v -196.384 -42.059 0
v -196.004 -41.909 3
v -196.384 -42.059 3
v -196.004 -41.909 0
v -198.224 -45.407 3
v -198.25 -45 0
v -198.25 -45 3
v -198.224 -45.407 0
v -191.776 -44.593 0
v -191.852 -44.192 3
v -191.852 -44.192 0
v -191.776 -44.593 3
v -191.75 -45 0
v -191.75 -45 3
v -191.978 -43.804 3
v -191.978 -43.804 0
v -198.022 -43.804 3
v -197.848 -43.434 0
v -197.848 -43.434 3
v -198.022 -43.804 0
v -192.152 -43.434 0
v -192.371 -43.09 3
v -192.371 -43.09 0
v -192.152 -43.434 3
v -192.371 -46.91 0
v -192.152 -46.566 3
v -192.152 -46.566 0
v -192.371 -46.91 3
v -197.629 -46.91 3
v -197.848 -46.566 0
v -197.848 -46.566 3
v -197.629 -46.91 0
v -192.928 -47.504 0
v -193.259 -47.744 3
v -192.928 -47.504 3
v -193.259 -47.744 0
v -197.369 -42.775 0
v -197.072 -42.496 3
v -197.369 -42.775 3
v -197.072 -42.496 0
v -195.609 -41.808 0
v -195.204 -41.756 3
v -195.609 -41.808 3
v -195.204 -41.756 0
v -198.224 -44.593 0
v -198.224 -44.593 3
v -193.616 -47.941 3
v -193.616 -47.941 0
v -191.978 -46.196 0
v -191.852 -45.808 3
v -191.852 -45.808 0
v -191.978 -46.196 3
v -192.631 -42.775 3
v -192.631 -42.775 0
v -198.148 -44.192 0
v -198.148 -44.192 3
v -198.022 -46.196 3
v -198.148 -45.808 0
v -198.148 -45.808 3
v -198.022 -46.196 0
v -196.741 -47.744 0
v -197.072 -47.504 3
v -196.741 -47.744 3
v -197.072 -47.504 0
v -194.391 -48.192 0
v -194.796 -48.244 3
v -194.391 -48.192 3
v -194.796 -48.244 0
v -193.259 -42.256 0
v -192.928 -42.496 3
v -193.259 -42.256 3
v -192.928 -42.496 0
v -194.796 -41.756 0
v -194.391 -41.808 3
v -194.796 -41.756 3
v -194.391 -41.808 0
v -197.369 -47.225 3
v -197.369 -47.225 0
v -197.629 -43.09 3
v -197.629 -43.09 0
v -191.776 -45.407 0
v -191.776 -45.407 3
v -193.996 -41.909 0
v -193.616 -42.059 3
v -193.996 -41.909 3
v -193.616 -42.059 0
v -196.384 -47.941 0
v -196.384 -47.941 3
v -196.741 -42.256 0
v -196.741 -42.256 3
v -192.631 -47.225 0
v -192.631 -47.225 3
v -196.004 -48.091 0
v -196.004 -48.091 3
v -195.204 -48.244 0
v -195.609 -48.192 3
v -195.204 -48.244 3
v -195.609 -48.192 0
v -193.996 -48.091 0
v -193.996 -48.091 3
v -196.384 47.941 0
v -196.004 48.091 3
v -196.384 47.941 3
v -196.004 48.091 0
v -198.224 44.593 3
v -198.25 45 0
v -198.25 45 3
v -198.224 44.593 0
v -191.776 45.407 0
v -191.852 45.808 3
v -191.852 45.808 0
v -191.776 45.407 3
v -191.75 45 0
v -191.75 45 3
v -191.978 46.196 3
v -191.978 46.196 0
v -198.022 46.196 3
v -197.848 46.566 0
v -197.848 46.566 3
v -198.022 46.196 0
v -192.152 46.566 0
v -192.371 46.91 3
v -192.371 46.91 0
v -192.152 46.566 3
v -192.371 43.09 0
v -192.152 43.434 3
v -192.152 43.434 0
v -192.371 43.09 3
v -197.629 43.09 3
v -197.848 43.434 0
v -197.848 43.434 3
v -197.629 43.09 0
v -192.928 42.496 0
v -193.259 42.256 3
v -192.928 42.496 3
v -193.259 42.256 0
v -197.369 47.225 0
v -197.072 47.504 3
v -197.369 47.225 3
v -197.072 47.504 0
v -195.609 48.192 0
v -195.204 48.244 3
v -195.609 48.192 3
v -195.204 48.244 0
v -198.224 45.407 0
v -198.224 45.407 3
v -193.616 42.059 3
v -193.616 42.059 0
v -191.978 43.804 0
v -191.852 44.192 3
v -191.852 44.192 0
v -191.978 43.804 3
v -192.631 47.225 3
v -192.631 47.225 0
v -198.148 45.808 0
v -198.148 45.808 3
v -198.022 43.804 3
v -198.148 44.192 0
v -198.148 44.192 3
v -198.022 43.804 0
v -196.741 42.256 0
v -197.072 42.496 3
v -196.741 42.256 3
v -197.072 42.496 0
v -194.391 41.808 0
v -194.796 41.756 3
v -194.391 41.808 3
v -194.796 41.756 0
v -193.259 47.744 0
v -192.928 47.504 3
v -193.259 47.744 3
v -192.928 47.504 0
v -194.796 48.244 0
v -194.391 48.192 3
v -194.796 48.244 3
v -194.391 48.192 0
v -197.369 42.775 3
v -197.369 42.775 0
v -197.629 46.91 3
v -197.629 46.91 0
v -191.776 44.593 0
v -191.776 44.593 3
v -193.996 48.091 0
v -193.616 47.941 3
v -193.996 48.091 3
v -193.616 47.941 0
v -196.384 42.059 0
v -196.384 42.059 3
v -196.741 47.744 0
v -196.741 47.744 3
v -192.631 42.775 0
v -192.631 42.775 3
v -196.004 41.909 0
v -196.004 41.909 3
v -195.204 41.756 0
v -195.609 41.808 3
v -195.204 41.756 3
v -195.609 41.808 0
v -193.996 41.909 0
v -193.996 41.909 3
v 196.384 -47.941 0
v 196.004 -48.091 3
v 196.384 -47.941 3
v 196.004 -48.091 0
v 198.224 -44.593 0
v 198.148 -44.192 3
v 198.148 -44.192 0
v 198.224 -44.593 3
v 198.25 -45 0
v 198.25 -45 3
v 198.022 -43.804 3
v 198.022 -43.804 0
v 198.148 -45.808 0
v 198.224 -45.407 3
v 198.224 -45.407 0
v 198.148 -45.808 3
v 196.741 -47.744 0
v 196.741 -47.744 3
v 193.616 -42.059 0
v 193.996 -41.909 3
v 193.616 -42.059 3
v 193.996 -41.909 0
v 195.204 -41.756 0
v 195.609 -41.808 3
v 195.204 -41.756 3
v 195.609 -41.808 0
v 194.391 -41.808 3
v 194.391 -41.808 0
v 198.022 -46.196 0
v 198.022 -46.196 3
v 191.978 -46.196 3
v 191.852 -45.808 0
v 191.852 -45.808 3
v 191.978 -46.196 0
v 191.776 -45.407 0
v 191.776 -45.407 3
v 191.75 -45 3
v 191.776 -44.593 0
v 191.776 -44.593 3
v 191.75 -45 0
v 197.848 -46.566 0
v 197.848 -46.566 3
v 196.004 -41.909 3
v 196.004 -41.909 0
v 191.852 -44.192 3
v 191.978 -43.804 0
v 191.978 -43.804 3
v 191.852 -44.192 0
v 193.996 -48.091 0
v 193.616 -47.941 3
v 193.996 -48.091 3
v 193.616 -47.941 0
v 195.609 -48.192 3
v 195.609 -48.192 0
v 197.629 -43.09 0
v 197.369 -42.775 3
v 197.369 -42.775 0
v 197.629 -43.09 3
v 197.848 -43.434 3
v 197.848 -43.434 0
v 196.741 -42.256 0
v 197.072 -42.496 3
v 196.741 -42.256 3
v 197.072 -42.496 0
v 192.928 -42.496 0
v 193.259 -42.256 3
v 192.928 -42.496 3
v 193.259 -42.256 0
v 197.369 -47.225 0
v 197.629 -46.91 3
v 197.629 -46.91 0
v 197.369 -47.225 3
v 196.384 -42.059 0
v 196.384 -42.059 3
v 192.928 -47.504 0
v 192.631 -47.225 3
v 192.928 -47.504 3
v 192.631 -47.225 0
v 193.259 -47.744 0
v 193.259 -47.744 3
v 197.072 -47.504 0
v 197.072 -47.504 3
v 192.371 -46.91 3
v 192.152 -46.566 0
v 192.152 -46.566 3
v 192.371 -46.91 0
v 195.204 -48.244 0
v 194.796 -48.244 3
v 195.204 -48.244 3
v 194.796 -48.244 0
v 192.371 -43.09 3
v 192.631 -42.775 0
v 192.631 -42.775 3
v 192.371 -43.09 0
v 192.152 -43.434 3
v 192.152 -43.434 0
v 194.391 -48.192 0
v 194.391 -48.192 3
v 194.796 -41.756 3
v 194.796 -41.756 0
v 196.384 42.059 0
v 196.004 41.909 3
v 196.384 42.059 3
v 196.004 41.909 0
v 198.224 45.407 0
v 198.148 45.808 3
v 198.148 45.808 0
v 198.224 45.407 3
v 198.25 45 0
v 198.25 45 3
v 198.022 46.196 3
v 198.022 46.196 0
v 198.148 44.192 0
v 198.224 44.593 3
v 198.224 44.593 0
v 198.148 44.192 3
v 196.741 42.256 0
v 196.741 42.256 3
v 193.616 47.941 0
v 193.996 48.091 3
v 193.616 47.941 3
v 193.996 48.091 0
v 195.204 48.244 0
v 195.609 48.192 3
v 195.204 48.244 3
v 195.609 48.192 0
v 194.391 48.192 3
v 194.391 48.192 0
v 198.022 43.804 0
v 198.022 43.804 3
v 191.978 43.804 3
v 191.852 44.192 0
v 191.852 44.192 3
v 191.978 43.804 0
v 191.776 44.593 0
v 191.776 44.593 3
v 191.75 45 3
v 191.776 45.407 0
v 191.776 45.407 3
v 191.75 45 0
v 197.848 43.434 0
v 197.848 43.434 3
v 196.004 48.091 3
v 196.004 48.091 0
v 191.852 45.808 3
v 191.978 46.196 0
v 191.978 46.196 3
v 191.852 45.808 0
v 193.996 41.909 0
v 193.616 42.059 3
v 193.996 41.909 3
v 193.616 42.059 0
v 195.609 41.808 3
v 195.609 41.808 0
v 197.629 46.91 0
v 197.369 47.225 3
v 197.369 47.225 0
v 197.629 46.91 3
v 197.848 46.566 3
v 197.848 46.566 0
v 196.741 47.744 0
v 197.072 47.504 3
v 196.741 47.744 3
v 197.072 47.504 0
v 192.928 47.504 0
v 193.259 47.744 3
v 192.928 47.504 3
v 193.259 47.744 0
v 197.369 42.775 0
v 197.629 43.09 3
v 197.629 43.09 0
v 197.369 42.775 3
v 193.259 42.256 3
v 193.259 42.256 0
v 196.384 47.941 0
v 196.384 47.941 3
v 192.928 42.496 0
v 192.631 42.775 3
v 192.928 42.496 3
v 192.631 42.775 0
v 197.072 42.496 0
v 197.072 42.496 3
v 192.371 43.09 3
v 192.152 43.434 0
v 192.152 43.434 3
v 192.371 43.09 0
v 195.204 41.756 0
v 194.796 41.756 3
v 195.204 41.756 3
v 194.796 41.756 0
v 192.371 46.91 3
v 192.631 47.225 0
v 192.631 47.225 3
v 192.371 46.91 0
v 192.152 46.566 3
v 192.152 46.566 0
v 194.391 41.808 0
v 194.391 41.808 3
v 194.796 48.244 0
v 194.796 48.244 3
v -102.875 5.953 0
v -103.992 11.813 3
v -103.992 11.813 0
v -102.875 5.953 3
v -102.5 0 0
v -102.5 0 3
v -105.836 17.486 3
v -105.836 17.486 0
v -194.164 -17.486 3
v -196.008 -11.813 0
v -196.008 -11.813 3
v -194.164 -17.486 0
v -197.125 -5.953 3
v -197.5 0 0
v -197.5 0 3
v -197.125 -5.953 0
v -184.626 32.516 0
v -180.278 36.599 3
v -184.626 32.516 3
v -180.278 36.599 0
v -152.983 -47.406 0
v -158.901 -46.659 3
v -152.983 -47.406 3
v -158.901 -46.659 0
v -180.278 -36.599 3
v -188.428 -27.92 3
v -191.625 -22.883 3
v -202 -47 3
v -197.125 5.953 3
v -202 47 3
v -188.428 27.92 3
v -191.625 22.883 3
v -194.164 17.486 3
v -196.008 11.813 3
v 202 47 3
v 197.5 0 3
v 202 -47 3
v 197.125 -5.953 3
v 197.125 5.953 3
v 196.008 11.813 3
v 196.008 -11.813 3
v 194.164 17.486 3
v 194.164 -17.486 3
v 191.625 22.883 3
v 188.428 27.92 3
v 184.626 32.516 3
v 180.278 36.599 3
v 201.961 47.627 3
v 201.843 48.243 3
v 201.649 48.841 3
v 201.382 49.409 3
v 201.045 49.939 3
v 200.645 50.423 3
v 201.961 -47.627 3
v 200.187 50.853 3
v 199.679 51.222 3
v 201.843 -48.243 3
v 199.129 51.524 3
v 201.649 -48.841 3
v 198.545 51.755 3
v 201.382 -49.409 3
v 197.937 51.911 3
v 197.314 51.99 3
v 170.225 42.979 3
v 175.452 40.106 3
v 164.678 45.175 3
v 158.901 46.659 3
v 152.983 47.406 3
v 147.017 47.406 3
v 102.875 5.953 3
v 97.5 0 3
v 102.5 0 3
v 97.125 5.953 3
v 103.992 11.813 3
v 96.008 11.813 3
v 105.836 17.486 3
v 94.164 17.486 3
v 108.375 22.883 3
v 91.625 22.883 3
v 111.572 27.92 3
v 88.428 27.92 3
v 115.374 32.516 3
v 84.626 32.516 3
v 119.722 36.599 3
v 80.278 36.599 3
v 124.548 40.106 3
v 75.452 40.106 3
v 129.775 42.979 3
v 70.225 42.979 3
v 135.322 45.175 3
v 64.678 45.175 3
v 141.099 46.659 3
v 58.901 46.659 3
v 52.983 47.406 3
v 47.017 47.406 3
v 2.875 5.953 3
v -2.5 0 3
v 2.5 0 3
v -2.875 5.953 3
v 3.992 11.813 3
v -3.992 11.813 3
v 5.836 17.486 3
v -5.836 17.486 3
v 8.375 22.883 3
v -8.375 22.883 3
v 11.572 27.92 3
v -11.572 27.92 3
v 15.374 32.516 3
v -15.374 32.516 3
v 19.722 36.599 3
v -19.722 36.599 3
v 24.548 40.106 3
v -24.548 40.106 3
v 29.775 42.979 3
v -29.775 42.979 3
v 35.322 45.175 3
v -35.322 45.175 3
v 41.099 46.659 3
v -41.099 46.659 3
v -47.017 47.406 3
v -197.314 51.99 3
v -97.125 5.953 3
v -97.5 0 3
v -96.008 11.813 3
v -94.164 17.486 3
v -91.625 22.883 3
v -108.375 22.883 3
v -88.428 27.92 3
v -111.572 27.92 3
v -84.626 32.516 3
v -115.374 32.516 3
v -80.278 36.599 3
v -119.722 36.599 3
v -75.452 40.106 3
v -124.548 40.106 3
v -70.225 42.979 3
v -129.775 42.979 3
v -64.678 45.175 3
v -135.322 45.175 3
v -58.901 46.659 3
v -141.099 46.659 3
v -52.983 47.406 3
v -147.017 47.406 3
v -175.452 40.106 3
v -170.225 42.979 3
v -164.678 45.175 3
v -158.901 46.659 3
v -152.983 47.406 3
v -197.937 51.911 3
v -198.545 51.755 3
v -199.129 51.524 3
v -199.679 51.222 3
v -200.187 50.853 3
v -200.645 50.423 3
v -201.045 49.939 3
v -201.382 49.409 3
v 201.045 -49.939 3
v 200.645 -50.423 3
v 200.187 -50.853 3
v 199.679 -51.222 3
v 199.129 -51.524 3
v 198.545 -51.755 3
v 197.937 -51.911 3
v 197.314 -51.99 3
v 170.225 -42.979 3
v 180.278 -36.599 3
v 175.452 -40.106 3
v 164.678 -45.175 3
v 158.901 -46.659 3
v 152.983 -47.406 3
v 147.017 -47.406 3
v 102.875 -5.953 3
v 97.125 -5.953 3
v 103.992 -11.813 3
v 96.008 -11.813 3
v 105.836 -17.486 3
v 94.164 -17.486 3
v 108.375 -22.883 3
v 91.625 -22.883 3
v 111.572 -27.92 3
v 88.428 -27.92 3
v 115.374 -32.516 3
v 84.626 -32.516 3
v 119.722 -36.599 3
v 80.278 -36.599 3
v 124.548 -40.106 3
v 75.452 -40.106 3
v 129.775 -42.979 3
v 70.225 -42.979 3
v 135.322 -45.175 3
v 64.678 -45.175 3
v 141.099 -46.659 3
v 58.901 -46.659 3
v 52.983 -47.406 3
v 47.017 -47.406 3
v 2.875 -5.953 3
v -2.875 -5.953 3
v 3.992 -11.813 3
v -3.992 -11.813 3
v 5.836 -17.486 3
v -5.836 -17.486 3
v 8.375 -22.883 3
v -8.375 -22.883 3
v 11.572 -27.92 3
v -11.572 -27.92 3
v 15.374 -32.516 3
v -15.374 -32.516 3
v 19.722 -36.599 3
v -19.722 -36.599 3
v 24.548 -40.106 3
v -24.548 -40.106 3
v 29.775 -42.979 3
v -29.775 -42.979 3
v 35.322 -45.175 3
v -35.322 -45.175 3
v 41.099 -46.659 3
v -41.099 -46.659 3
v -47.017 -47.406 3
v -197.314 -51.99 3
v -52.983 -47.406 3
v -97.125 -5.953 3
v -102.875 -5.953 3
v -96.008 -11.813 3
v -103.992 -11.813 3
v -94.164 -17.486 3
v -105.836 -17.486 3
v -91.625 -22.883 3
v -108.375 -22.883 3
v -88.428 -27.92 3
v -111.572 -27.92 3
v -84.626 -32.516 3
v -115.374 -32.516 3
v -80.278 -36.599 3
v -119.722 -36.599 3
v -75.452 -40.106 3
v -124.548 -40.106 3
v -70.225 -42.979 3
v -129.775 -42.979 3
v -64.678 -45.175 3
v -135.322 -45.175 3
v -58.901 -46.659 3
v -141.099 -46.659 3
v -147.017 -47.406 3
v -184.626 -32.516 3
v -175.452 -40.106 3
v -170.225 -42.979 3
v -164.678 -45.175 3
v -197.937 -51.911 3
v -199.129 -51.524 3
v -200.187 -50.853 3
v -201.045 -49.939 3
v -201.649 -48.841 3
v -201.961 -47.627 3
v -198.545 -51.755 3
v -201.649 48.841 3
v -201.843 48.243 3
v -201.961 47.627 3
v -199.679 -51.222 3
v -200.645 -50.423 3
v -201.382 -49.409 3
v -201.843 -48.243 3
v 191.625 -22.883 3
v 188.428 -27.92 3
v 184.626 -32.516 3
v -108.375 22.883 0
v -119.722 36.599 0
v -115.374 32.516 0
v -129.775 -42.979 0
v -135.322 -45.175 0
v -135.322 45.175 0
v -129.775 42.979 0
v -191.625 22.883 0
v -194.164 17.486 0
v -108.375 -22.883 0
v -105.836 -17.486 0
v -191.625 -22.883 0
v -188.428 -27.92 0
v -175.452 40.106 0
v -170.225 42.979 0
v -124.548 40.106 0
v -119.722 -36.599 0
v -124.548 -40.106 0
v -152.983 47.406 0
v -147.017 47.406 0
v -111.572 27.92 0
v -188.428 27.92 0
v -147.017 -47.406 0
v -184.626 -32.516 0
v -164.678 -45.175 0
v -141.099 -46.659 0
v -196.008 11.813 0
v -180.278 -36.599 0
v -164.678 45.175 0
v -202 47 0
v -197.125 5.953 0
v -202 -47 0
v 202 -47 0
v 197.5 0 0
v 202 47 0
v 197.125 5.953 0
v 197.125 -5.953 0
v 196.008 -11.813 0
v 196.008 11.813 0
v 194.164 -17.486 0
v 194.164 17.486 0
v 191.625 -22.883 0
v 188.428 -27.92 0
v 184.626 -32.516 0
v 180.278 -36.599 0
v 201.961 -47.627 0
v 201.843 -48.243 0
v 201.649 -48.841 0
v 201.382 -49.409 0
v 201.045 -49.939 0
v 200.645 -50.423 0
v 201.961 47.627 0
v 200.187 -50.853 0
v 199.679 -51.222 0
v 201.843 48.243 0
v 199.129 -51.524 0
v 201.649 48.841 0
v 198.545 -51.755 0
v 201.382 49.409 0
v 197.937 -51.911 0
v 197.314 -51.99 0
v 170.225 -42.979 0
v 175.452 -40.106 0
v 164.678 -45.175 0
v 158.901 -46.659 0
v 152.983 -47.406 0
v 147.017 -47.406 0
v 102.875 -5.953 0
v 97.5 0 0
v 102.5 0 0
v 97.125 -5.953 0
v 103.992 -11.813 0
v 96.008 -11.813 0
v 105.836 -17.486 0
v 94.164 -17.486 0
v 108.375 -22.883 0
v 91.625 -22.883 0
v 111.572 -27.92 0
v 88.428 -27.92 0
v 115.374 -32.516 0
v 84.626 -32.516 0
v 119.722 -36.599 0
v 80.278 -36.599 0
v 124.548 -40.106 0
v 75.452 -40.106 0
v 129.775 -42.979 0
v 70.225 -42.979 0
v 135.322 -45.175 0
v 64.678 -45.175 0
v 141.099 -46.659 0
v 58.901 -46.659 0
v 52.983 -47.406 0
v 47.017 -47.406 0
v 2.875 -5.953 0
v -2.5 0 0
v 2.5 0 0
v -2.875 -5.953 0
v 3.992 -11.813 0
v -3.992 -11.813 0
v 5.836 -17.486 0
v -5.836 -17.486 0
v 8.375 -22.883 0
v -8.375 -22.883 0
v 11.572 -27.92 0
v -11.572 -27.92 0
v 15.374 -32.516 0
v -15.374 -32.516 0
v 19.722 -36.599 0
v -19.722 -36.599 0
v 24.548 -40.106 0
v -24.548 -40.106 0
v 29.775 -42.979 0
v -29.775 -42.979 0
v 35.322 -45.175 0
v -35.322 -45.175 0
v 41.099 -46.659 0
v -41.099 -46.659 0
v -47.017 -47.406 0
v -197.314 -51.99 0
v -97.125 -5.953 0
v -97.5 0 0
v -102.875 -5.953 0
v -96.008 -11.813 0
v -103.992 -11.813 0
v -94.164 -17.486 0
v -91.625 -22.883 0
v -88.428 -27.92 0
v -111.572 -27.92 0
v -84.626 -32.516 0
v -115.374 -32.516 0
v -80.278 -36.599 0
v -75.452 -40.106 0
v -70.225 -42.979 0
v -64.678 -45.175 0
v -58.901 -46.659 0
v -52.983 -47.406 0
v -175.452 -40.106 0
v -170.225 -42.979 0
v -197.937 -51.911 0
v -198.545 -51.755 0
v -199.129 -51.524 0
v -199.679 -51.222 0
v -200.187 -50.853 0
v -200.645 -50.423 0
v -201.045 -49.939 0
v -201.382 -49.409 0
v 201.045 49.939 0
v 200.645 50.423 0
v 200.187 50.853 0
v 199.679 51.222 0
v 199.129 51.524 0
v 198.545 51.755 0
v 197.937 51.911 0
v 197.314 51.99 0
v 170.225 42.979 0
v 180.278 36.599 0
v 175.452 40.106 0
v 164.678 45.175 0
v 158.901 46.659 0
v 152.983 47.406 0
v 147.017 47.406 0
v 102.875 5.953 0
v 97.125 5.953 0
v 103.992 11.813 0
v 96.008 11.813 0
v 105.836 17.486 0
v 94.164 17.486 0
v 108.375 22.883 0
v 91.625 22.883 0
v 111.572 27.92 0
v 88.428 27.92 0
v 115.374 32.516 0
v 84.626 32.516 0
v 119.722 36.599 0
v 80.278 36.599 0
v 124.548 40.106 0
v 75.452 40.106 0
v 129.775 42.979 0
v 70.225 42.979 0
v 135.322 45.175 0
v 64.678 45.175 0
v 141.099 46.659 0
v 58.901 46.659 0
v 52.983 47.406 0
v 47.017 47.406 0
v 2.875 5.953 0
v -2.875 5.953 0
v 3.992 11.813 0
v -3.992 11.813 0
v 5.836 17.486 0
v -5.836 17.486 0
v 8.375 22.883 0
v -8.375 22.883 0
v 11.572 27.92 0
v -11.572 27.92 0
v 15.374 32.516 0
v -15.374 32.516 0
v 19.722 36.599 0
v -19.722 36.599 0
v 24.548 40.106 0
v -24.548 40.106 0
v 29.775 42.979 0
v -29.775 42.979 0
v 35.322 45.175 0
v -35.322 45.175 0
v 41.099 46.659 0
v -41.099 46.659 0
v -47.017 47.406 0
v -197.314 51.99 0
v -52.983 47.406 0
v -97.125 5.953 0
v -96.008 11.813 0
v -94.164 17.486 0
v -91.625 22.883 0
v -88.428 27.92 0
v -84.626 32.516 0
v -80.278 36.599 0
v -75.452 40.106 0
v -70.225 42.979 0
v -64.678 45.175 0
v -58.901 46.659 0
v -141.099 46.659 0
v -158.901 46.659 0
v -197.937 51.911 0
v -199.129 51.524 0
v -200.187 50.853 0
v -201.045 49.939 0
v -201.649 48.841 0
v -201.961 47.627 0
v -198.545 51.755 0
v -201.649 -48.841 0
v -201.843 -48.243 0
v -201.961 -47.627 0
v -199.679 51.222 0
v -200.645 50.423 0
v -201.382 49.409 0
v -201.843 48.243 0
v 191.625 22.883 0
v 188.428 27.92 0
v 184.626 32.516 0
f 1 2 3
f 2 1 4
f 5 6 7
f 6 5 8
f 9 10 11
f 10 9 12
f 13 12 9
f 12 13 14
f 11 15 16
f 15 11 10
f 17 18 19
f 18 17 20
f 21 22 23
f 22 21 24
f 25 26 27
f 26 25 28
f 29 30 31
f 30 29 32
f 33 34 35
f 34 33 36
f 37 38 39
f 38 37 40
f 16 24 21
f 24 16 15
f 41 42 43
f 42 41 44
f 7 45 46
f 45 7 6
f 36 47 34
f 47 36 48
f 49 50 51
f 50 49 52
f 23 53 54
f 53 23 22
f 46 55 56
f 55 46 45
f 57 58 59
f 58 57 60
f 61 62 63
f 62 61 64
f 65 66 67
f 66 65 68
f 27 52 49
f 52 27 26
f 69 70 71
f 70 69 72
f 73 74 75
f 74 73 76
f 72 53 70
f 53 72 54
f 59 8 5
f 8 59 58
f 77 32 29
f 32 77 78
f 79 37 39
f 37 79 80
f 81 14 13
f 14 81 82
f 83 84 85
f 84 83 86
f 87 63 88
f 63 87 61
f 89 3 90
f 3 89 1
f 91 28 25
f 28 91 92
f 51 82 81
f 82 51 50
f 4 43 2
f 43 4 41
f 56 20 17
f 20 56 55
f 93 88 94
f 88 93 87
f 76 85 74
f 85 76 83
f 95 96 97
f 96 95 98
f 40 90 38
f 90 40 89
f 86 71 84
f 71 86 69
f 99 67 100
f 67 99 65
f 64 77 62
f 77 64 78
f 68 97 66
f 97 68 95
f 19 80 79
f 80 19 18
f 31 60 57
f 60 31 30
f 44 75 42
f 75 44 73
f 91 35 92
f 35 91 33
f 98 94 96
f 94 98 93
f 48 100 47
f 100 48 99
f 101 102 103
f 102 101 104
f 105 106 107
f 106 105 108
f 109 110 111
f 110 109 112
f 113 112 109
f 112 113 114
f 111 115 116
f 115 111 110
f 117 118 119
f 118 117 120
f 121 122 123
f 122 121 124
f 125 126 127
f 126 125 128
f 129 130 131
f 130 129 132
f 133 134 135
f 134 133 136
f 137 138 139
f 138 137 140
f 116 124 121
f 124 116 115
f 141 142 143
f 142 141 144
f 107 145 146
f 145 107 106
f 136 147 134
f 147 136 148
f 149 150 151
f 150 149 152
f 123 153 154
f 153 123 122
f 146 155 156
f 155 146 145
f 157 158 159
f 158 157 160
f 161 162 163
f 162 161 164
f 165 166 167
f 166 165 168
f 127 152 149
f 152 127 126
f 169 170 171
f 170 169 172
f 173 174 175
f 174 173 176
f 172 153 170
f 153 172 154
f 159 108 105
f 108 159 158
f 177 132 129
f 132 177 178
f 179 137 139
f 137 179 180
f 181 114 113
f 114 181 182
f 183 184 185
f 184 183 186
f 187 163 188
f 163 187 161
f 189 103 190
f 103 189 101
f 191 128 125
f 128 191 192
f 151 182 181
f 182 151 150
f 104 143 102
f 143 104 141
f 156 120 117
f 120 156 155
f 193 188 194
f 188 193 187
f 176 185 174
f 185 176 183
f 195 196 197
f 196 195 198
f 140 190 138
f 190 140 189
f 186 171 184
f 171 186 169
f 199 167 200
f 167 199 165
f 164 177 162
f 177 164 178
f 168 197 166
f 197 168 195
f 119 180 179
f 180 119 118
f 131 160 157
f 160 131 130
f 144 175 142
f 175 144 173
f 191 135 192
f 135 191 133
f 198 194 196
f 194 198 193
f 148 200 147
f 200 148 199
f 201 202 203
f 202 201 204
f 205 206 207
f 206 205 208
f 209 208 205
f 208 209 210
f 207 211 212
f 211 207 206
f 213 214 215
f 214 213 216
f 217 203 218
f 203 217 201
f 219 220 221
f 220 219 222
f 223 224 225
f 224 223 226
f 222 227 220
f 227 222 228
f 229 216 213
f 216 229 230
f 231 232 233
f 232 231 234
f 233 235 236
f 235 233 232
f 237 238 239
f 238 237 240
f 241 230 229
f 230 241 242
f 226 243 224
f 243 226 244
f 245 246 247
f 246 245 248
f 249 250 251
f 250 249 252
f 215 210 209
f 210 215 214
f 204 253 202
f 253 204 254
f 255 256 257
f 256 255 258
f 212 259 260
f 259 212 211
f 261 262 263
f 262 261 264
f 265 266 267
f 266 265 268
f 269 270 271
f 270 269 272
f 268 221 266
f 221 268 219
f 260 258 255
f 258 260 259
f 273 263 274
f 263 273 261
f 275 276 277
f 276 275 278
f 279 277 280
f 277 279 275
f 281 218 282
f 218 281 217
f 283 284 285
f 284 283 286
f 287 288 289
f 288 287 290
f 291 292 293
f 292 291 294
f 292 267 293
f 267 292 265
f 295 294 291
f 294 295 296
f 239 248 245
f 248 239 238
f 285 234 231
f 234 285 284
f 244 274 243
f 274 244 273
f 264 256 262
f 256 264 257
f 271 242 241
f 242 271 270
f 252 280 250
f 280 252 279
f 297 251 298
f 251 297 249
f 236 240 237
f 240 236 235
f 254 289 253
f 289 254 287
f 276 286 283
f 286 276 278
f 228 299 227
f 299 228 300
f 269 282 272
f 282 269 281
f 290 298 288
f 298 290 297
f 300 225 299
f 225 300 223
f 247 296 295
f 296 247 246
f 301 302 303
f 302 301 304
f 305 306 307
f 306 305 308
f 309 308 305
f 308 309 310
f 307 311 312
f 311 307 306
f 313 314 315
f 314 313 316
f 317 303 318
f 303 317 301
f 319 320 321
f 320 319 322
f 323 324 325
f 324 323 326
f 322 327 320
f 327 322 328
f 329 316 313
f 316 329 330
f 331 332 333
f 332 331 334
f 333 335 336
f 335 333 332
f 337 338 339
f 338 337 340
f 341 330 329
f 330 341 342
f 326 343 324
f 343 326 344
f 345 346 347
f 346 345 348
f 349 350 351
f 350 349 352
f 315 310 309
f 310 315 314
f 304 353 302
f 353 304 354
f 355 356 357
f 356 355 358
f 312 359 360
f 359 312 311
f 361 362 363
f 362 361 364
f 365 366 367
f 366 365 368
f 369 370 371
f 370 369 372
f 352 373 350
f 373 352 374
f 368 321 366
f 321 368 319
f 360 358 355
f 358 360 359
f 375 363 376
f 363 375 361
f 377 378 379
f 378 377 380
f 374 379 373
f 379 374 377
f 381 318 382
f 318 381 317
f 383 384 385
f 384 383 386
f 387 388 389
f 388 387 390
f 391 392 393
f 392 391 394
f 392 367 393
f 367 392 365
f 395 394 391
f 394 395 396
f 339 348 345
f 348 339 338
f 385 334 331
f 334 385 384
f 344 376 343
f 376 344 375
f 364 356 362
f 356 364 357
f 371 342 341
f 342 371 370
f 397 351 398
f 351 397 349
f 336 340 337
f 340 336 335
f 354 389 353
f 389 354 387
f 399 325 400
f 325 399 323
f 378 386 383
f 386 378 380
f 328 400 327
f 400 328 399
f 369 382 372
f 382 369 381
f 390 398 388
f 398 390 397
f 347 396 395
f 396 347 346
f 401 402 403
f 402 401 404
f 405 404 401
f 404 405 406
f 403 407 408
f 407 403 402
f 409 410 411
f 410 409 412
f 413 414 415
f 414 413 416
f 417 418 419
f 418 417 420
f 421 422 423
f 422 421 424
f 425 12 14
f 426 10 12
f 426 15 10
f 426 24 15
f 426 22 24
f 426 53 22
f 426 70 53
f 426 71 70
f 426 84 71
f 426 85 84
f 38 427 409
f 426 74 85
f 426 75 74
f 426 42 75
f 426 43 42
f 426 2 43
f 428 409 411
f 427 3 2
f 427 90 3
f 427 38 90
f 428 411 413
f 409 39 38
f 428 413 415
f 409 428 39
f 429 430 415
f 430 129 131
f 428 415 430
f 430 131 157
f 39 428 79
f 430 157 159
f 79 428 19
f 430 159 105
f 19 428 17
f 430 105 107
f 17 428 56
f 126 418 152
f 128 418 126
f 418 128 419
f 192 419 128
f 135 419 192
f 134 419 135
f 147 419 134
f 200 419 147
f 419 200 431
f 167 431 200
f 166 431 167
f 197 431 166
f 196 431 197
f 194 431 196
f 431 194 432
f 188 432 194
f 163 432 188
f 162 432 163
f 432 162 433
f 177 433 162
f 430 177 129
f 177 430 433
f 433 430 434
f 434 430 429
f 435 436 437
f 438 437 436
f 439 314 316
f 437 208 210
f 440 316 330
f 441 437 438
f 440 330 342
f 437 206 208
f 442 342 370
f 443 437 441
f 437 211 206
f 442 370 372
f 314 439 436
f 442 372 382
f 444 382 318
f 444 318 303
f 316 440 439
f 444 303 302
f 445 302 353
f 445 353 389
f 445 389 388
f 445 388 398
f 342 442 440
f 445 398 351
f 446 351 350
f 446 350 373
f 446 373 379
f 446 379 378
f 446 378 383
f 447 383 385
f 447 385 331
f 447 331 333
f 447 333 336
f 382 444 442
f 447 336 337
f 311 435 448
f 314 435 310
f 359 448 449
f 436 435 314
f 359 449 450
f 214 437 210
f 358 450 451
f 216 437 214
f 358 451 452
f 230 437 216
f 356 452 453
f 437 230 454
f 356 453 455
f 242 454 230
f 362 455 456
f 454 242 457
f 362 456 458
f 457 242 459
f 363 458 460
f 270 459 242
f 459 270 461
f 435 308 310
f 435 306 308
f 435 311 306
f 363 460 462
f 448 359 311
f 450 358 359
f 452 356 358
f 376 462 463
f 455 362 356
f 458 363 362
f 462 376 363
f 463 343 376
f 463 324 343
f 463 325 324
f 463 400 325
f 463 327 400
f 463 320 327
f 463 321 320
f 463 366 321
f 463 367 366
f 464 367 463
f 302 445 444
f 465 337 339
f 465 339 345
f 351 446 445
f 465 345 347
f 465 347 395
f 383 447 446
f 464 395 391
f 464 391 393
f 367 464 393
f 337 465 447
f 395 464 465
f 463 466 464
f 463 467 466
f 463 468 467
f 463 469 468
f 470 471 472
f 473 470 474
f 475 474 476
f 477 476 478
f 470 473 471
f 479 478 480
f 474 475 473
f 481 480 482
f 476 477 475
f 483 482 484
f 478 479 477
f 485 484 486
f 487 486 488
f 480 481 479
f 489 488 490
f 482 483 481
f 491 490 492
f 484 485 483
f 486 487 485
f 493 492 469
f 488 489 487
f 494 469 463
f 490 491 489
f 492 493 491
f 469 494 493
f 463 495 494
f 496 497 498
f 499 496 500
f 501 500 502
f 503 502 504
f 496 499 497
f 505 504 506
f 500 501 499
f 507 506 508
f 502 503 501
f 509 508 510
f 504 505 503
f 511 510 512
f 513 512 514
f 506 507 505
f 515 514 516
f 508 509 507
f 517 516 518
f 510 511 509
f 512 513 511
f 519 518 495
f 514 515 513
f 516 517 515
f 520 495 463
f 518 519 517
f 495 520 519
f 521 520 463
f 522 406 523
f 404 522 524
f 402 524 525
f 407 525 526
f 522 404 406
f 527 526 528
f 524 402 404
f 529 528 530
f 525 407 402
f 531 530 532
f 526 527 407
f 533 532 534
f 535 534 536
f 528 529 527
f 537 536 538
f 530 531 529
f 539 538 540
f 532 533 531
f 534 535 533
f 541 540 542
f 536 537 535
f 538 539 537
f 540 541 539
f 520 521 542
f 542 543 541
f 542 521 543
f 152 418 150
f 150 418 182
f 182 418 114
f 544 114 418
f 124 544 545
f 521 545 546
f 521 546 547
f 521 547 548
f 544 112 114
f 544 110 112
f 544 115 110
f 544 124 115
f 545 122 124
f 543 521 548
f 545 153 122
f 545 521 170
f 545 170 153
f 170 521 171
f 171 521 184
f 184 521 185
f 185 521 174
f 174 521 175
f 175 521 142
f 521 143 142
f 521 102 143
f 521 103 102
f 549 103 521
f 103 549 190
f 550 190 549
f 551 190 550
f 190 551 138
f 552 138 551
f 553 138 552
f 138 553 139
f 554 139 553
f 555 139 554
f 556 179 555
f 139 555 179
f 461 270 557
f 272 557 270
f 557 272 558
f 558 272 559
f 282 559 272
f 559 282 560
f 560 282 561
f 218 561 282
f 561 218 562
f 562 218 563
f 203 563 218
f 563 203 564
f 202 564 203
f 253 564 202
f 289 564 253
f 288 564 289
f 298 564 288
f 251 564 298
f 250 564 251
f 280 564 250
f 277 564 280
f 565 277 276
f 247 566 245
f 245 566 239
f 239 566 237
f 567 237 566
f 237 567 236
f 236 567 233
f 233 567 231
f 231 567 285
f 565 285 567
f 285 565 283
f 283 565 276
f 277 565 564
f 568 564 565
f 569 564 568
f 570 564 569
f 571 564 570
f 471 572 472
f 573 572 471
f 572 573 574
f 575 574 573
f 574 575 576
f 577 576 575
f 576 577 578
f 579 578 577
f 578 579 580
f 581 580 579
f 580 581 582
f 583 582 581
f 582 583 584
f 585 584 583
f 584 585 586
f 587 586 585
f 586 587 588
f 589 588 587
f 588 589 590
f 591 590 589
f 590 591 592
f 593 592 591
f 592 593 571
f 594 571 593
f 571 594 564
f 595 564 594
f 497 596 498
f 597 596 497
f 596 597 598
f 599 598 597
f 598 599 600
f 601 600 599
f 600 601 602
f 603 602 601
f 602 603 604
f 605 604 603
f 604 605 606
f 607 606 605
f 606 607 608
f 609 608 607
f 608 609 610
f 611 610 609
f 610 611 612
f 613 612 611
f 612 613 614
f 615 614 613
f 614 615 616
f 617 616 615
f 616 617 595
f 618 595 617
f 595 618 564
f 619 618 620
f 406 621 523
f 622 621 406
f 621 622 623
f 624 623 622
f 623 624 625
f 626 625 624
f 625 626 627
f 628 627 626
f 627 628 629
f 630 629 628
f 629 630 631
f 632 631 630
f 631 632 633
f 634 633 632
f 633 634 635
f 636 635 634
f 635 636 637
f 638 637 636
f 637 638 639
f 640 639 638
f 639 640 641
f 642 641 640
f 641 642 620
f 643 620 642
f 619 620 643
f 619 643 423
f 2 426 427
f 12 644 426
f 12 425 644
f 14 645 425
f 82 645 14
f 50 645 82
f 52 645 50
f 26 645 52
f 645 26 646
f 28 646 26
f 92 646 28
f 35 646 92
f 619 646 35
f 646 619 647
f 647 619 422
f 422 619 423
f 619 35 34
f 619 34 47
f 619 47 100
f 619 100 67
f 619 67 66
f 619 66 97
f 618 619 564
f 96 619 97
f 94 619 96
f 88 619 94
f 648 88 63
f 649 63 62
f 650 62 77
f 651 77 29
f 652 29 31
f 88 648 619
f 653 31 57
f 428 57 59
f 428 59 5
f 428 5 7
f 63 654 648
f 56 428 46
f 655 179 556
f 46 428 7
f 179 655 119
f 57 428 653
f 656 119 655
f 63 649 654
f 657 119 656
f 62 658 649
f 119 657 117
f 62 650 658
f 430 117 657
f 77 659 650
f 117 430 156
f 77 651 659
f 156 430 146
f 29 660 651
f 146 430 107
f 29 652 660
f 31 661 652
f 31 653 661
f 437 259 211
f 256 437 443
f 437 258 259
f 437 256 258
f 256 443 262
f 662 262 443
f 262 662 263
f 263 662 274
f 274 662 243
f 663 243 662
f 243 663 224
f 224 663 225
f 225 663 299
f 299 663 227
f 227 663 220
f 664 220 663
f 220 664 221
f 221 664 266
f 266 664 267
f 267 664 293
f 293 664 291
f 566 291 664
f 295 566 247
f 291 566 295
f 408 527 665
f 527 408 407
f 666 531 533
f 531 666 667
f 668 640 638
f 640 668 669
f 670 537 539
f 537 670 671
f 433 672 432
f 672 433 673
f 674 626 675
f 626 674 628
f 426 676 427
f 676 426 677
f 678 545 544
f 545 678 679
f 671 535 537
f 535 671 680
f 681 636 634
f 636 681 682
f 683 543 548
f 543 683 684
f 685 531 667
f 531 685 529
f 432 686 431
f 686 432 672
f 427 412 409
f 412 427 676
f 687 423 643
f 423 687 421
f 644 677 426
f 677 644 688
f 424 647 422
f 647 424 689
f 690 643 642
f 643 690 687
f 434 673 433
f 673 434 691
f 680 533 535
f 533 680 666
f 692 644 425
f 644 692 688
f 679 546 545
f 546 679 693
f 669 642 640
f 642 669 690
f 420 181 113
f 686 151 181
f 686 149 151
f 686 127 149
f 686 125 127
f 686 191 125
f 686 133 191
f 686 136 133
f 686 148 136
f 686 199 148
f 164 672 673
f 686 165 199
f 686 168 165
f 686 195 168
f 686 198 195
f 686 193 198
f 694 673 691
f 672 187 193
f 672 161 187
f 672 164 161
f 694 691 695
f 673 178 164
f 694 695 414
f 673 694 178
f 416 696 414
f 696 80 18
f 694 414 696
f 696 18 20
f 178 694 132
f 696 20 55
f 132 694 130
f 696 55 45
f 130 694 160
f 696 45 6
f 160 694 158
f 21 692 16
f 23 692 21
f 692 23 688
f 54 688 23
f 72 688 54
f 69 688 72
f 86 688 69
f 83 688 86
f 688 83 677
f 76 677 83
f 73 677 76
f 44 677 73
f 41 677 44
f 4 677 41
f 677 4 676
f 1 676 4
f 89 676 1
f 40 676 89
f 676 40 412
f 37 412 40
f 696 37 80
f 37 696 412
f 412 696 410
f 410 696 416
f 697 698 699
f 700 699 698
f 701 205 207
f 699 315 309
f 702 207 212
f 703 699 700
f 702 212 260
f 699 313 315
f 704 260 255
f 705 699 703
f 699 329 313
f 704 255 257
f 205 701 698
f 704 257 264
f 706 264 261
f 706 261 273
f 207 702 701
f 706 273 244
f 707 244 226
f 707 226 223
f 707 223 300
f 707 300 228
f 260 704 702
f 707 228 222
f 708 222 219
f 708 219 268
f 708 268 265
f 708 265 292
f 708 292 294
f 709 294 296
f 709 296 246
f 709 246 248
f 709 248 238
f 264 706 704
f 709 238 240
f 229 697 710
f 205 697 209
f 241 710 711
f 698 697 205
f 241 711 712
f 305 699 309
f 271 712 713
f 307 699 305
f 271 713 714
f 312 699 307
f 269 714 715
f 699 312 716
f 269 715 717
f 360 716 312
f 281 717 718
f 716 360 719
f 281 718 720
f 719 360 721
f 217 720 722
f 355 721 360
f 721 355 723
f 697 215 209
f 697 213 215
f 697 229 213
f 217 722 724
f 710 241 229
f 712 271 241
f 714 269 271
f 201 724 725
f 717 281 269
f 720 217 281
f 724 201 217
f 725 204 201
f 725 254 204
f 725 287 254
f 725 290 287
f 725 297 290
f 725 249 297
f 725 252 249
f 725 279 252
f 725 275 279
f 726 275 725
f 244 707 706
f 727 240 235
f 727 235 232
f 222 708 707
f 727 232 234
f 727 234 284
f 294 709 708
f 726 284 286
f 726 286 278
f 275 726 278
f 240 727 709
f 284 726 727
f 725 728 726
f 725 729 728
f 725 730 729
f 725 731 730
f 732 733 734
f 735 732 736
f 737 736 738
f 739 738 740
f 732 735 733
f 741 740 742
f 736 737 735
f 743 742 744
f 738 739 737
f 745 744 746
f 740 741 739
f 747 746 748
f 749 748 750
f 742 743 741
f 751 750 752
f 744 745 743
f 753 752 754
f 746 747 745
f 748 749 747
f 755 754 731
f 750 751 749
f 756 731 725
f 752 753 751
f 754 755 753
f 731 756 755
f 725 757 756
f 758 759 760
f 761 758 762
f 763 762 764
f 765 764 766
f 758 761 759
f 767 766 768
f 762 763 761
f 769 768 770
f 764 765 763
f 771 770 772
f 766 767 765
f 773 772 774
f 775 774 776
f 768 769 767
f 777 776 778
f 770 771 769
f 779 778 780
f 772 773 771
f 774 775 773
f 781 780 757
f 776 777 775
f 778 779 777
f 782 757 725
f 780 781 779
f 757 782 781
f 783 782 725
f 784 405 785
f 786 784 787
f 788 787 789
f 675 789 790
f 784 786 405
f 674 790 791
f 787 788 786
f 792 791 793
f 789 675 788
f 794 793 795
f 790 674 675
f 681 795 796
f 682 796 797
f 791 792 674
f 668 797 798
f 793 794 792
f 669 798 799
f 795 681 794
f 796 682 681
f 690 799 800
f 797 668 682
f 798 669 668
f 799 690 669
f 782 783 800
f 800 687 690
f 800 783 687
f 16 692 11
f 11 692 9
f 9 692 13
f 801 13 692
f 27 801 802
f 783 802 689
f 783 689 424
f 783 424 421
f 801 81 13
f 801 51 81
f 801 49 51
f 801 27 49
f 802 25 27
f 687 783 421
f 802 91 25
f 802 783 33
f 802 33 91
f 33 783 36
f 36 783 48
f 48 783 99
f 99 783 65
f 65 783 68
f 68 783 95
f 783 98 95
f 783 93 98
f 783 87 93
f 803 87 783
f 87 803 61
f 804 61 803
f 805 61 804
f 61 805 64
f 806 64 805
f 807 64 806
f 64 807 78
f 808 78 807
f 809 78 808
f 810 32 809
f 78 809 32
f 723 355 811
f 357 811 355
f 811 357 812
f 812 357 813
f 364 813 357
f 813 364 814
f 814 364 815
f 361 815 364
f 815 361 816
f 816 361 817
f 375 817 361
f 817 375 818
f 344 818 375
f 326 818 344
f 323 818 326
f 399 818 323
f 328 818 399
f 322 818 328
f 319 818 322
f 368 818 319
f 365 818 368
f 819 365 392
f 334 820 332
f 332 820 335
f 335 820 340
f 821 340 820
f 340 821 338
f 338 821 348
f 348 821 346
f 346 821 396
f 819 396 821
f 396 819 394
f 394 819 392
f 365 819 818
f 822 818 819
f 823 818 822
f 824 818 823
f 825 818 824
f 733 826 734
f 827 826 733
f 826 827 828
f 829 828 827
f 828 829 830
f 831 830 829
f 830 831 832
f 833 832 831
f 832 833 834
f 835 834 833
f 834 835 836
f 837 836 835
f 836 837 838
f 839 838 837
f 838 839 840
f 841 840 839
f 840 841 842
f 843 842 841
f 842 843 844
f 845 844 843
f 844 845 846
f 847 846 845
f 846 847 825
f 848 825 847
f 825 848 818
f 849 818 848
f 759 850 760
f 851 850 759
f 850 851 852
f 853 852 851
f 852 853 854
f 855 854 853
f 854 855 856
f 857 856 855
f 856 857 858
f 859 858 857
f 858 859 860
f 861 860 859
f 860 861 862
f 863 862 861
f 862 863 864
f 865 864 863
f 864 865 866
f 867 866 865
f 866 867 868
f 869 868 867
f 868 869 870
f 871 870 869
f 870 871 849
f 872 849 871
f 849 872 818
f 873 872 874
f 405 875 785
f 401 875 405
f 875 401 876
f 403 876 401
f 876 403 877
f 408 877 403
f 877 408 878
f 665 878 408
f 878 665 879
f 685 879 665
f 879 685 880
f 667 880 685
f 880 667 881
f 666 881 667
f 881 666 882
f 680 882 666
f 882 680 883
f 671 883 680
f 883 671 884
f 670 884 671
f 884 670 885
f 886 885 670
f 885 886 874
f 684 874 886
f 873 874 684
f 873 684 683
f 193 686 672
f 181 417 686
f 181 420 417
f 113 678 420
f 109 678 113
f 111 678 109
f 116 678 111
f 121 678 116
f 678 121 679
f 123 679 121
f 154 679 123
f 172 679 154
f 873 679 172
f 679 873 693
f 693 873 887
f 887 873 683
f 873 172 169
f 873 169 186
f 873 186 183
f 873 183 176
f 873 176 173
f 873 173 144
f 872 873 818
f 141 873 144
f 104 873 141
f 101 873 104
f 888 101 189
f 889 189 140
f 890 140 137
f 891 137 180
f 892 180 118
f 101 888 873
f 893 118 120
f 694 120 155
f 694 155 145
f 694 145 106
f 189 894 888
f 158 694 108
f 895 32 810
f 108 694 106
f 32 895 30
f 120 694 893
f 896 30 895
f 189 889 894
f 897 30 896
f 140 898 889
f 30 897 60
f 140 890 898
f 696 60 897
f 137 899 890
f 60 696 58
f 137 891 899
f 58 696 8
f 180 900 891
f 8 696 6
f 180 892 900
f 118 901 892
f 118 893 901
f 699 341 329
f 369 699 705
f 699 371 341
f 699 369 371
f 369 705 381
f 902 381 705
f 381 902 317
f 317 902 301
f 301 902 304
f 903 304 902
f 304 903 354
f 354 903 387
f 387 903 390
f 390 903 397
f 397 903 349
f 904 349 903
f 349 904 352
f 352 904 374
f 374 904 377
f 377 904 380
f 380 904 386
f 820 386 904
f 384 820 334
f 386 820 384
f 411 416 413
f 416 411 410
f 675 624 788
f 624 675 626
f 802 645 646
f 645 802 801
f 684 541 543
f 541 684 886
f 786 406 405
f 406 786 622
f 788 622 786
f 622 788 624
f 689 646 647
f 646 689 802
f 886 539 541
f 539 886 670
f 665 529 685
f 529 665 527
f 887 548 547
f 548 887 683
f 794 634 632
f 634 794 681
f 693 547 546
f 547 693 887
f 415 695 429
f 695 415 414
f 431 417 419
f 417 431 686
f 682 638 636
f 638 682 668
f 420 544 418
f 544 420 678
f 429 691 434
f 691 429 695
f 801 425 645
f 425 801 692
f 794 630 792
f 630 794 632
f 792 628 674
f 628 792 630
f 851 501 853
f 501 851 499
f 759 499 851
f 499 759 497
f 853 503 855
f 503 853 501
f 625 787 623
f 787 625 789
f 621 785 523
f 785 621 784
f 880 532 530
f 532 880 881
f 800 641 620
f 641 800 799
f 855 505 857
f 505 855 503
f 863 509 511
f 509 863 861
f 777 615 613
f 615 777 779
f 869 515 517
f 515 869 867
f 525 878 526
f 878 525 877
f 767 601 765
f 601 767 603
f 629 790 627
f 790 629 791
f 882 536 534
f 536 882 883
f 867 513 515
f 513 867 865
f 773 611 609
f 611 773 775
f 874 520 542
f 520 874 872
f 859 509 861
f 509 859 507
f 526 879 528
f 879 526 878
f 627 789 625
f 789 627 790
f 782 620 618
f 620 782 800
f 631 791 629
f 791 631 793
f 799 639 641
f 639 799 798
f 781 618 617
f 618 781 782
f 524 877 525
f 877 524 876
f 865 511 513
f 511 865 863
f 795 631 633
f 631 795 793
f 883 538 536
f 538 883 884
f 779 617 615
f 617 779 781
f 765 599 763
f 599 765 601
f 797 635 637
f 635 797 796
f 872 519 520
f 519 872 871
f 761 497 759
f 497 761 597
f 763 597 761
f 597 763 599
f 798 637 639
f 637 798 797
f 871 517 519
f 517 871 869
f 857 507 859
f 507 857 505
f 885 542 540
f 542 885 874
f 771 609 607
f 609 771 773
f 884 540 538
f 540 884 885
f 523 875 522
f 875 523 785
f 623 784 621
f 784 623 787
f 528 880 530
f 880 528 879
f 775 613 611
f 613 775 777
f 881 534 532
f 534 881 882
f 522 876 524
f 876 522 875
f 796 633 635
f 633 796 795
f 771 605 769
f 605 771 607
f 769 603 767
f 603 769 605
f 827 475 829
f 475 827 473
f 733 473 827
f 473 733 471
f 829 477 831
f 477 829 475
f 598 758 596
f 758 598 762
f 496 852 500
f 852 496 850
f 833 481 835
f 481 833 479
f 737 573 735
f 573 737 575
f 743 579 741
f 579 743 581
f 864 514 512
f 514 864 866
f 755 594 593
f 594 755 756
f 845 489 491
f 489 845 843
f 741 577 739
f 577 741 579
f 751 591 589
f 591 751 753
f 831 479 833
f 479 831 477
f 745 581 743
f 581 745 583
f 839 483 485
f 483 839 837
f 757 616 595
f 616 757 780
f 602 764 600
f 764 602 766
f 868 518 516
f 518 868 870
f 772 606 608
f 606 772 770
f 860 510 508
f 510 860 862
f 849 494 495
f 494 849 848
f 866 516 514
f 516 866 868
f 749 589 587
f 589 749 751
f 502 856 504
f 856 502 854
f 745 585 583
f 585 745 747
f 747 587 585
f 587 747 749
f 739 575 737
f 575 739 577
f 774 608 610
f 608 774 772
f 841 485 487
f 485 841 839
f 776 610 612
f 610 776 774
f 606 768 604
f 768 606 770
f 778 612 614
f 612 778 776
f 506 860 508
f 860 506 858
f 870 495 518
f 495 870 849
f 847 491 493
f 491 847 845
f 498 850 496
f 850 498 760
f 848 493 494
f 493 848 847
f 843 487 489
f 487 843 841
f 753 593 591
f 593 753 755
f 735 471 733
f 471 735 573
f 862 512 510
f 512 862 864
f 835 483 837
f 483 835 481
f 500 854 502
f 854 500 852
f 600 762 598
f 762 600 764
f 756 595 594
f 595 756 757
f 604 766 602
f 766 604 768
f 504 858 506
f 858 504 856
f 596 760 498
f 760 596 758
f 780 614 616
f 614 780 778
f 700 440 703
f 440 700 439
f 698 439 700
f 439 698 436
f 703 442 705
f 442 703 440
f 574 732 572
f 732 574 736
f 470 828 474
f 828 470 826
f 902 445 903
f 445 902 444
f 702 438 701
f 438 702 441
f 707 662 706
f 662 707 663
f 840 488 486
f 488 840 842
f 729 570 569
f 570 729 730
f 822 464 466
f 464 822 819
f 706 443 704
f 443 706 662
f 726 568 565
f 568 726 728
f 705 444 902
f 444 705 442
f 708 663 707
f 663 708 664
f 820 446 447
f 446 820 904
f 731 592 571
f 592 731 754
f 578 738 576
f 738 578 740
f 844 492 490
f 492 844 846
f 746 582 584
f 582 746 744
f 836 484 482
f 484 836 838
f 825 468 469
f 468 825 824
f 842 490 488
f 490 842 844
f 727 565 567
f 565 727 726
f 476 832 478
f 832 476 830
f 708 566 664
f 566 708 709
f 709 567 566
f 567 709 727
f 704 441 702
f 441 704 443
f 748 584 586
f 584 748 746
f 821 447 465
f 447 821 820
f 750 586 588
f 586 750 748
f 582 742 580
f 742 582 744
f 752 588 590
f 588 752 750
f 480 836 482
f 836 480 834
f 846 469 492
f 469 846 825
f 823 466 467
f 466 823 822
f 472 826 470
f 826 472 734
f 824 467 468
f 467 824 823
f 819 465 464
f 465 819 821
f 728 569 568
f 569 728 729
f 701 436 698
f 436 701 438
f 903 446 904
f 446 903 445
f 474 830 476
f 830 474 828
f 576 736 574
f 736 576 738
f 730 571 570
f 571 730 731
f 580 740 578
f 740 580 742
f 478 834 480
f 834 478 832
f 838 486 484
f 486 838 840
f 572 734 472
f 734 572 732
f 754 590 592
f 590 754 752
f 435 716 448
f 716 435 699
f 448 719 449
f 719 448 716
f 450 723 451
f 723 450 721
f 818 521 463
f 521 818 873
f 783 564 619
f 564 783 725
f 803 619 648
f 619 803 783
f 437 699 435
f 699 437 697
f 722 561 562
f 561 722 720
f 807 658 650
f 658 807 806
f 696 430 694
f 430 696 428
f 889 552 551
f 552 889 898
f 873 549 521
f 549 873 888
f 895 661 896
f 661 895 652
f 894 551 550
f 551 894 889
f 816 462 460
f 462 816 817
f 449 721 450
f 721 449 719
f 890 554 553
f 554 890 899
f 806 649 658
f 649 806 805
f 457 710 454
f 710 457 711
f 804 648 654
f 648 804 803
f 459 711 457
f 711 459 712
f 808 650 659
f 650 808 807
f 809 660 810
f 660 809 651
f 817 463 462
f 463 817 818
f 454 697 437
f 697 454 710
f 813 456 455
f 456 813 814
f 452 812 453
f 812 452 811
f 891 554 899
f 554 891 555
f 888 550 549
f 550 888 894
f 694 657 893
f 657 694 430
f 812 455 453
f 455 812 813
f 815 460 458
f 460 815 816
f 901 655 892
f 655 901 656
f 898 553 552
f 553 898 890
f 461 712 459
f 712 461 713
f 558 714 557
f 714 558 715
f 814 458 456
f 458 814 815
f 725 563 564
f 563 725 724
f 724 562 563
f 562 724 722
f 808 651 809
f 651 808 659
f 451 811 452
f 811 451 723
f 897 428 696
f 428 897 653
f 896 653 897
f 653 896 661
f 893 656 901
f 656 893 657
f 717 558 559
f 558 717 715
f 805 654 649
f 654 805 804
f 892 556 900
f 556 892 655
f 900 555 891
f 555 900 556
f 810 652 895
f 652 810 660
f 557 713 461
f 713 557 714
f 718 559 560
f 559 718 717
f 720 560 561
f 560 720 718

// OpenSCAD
$fn = 50;

difference() {
	union() {
		hull() {
			translate(v = [-197.0, 47.0, 0]) {
				cylinder(h = 3, r = 5);
			}
			translate(v = [197.0, 47.0, 0]) {
				cylinder(h = 3, r = 5);
			}
			translate(v = [-197.0, -47.0, 0]) {
				cylinder(h = 3, r = 5);
			}
			translate(v = [197.0, -47.0, 0]) {
				cylinder(h = 3, r = 5);
			}
		}
	}
	union() {
		translate(v = [-195.0, -45.0, -100.0]) {
			cylinder(h = 200, r = 3.25);
		}
		translate(v = [-195.0, 45.0, -100.0]) {
			cylinder(h = 200, r = 3.25);
		}
		translate(v = [195.0, -45.0, -100.0]) {
			cylinder(h = 200, r = 3.25);
		}
		translate(v = [195.0, 45.0, -100.0]) {
			cylinder(h = 200, r = 3.25);
		}
		translate(v = [-195.0, -45.0, -100.0]) {
			cylinder(h = 200, r = 1.8);
		}
		translate(v = [-195.0, 45.0, -100.0]) {
			cylinder(h = 200, r = 1.8);
		}
		translate(v = [195.0, -45.0, -100.0]) {
			cylinder(h = 200, r = 1.8);
		}
		translate(v = [195.0, 45.0, -100.0]) {
			cylinder(h = 200, r = 1.8);
		}
		translate(v = [-150.0, 0, 0.0]) {
			cylinder(h = 3, r = 47.5);
		}
		translate(v = [-50.0, 0, 0.0]) {
			cylinder(h = 3, r = 47.5);
		}
		translate(v = [50.0, 0, 0.0]) {
			cylinder(h = 3, r = 47.5);
		}
		translate(v = [150.0, 0, 0.0]) {
			cylinder(h = 3, r = 47.5);
		}
	}
}
